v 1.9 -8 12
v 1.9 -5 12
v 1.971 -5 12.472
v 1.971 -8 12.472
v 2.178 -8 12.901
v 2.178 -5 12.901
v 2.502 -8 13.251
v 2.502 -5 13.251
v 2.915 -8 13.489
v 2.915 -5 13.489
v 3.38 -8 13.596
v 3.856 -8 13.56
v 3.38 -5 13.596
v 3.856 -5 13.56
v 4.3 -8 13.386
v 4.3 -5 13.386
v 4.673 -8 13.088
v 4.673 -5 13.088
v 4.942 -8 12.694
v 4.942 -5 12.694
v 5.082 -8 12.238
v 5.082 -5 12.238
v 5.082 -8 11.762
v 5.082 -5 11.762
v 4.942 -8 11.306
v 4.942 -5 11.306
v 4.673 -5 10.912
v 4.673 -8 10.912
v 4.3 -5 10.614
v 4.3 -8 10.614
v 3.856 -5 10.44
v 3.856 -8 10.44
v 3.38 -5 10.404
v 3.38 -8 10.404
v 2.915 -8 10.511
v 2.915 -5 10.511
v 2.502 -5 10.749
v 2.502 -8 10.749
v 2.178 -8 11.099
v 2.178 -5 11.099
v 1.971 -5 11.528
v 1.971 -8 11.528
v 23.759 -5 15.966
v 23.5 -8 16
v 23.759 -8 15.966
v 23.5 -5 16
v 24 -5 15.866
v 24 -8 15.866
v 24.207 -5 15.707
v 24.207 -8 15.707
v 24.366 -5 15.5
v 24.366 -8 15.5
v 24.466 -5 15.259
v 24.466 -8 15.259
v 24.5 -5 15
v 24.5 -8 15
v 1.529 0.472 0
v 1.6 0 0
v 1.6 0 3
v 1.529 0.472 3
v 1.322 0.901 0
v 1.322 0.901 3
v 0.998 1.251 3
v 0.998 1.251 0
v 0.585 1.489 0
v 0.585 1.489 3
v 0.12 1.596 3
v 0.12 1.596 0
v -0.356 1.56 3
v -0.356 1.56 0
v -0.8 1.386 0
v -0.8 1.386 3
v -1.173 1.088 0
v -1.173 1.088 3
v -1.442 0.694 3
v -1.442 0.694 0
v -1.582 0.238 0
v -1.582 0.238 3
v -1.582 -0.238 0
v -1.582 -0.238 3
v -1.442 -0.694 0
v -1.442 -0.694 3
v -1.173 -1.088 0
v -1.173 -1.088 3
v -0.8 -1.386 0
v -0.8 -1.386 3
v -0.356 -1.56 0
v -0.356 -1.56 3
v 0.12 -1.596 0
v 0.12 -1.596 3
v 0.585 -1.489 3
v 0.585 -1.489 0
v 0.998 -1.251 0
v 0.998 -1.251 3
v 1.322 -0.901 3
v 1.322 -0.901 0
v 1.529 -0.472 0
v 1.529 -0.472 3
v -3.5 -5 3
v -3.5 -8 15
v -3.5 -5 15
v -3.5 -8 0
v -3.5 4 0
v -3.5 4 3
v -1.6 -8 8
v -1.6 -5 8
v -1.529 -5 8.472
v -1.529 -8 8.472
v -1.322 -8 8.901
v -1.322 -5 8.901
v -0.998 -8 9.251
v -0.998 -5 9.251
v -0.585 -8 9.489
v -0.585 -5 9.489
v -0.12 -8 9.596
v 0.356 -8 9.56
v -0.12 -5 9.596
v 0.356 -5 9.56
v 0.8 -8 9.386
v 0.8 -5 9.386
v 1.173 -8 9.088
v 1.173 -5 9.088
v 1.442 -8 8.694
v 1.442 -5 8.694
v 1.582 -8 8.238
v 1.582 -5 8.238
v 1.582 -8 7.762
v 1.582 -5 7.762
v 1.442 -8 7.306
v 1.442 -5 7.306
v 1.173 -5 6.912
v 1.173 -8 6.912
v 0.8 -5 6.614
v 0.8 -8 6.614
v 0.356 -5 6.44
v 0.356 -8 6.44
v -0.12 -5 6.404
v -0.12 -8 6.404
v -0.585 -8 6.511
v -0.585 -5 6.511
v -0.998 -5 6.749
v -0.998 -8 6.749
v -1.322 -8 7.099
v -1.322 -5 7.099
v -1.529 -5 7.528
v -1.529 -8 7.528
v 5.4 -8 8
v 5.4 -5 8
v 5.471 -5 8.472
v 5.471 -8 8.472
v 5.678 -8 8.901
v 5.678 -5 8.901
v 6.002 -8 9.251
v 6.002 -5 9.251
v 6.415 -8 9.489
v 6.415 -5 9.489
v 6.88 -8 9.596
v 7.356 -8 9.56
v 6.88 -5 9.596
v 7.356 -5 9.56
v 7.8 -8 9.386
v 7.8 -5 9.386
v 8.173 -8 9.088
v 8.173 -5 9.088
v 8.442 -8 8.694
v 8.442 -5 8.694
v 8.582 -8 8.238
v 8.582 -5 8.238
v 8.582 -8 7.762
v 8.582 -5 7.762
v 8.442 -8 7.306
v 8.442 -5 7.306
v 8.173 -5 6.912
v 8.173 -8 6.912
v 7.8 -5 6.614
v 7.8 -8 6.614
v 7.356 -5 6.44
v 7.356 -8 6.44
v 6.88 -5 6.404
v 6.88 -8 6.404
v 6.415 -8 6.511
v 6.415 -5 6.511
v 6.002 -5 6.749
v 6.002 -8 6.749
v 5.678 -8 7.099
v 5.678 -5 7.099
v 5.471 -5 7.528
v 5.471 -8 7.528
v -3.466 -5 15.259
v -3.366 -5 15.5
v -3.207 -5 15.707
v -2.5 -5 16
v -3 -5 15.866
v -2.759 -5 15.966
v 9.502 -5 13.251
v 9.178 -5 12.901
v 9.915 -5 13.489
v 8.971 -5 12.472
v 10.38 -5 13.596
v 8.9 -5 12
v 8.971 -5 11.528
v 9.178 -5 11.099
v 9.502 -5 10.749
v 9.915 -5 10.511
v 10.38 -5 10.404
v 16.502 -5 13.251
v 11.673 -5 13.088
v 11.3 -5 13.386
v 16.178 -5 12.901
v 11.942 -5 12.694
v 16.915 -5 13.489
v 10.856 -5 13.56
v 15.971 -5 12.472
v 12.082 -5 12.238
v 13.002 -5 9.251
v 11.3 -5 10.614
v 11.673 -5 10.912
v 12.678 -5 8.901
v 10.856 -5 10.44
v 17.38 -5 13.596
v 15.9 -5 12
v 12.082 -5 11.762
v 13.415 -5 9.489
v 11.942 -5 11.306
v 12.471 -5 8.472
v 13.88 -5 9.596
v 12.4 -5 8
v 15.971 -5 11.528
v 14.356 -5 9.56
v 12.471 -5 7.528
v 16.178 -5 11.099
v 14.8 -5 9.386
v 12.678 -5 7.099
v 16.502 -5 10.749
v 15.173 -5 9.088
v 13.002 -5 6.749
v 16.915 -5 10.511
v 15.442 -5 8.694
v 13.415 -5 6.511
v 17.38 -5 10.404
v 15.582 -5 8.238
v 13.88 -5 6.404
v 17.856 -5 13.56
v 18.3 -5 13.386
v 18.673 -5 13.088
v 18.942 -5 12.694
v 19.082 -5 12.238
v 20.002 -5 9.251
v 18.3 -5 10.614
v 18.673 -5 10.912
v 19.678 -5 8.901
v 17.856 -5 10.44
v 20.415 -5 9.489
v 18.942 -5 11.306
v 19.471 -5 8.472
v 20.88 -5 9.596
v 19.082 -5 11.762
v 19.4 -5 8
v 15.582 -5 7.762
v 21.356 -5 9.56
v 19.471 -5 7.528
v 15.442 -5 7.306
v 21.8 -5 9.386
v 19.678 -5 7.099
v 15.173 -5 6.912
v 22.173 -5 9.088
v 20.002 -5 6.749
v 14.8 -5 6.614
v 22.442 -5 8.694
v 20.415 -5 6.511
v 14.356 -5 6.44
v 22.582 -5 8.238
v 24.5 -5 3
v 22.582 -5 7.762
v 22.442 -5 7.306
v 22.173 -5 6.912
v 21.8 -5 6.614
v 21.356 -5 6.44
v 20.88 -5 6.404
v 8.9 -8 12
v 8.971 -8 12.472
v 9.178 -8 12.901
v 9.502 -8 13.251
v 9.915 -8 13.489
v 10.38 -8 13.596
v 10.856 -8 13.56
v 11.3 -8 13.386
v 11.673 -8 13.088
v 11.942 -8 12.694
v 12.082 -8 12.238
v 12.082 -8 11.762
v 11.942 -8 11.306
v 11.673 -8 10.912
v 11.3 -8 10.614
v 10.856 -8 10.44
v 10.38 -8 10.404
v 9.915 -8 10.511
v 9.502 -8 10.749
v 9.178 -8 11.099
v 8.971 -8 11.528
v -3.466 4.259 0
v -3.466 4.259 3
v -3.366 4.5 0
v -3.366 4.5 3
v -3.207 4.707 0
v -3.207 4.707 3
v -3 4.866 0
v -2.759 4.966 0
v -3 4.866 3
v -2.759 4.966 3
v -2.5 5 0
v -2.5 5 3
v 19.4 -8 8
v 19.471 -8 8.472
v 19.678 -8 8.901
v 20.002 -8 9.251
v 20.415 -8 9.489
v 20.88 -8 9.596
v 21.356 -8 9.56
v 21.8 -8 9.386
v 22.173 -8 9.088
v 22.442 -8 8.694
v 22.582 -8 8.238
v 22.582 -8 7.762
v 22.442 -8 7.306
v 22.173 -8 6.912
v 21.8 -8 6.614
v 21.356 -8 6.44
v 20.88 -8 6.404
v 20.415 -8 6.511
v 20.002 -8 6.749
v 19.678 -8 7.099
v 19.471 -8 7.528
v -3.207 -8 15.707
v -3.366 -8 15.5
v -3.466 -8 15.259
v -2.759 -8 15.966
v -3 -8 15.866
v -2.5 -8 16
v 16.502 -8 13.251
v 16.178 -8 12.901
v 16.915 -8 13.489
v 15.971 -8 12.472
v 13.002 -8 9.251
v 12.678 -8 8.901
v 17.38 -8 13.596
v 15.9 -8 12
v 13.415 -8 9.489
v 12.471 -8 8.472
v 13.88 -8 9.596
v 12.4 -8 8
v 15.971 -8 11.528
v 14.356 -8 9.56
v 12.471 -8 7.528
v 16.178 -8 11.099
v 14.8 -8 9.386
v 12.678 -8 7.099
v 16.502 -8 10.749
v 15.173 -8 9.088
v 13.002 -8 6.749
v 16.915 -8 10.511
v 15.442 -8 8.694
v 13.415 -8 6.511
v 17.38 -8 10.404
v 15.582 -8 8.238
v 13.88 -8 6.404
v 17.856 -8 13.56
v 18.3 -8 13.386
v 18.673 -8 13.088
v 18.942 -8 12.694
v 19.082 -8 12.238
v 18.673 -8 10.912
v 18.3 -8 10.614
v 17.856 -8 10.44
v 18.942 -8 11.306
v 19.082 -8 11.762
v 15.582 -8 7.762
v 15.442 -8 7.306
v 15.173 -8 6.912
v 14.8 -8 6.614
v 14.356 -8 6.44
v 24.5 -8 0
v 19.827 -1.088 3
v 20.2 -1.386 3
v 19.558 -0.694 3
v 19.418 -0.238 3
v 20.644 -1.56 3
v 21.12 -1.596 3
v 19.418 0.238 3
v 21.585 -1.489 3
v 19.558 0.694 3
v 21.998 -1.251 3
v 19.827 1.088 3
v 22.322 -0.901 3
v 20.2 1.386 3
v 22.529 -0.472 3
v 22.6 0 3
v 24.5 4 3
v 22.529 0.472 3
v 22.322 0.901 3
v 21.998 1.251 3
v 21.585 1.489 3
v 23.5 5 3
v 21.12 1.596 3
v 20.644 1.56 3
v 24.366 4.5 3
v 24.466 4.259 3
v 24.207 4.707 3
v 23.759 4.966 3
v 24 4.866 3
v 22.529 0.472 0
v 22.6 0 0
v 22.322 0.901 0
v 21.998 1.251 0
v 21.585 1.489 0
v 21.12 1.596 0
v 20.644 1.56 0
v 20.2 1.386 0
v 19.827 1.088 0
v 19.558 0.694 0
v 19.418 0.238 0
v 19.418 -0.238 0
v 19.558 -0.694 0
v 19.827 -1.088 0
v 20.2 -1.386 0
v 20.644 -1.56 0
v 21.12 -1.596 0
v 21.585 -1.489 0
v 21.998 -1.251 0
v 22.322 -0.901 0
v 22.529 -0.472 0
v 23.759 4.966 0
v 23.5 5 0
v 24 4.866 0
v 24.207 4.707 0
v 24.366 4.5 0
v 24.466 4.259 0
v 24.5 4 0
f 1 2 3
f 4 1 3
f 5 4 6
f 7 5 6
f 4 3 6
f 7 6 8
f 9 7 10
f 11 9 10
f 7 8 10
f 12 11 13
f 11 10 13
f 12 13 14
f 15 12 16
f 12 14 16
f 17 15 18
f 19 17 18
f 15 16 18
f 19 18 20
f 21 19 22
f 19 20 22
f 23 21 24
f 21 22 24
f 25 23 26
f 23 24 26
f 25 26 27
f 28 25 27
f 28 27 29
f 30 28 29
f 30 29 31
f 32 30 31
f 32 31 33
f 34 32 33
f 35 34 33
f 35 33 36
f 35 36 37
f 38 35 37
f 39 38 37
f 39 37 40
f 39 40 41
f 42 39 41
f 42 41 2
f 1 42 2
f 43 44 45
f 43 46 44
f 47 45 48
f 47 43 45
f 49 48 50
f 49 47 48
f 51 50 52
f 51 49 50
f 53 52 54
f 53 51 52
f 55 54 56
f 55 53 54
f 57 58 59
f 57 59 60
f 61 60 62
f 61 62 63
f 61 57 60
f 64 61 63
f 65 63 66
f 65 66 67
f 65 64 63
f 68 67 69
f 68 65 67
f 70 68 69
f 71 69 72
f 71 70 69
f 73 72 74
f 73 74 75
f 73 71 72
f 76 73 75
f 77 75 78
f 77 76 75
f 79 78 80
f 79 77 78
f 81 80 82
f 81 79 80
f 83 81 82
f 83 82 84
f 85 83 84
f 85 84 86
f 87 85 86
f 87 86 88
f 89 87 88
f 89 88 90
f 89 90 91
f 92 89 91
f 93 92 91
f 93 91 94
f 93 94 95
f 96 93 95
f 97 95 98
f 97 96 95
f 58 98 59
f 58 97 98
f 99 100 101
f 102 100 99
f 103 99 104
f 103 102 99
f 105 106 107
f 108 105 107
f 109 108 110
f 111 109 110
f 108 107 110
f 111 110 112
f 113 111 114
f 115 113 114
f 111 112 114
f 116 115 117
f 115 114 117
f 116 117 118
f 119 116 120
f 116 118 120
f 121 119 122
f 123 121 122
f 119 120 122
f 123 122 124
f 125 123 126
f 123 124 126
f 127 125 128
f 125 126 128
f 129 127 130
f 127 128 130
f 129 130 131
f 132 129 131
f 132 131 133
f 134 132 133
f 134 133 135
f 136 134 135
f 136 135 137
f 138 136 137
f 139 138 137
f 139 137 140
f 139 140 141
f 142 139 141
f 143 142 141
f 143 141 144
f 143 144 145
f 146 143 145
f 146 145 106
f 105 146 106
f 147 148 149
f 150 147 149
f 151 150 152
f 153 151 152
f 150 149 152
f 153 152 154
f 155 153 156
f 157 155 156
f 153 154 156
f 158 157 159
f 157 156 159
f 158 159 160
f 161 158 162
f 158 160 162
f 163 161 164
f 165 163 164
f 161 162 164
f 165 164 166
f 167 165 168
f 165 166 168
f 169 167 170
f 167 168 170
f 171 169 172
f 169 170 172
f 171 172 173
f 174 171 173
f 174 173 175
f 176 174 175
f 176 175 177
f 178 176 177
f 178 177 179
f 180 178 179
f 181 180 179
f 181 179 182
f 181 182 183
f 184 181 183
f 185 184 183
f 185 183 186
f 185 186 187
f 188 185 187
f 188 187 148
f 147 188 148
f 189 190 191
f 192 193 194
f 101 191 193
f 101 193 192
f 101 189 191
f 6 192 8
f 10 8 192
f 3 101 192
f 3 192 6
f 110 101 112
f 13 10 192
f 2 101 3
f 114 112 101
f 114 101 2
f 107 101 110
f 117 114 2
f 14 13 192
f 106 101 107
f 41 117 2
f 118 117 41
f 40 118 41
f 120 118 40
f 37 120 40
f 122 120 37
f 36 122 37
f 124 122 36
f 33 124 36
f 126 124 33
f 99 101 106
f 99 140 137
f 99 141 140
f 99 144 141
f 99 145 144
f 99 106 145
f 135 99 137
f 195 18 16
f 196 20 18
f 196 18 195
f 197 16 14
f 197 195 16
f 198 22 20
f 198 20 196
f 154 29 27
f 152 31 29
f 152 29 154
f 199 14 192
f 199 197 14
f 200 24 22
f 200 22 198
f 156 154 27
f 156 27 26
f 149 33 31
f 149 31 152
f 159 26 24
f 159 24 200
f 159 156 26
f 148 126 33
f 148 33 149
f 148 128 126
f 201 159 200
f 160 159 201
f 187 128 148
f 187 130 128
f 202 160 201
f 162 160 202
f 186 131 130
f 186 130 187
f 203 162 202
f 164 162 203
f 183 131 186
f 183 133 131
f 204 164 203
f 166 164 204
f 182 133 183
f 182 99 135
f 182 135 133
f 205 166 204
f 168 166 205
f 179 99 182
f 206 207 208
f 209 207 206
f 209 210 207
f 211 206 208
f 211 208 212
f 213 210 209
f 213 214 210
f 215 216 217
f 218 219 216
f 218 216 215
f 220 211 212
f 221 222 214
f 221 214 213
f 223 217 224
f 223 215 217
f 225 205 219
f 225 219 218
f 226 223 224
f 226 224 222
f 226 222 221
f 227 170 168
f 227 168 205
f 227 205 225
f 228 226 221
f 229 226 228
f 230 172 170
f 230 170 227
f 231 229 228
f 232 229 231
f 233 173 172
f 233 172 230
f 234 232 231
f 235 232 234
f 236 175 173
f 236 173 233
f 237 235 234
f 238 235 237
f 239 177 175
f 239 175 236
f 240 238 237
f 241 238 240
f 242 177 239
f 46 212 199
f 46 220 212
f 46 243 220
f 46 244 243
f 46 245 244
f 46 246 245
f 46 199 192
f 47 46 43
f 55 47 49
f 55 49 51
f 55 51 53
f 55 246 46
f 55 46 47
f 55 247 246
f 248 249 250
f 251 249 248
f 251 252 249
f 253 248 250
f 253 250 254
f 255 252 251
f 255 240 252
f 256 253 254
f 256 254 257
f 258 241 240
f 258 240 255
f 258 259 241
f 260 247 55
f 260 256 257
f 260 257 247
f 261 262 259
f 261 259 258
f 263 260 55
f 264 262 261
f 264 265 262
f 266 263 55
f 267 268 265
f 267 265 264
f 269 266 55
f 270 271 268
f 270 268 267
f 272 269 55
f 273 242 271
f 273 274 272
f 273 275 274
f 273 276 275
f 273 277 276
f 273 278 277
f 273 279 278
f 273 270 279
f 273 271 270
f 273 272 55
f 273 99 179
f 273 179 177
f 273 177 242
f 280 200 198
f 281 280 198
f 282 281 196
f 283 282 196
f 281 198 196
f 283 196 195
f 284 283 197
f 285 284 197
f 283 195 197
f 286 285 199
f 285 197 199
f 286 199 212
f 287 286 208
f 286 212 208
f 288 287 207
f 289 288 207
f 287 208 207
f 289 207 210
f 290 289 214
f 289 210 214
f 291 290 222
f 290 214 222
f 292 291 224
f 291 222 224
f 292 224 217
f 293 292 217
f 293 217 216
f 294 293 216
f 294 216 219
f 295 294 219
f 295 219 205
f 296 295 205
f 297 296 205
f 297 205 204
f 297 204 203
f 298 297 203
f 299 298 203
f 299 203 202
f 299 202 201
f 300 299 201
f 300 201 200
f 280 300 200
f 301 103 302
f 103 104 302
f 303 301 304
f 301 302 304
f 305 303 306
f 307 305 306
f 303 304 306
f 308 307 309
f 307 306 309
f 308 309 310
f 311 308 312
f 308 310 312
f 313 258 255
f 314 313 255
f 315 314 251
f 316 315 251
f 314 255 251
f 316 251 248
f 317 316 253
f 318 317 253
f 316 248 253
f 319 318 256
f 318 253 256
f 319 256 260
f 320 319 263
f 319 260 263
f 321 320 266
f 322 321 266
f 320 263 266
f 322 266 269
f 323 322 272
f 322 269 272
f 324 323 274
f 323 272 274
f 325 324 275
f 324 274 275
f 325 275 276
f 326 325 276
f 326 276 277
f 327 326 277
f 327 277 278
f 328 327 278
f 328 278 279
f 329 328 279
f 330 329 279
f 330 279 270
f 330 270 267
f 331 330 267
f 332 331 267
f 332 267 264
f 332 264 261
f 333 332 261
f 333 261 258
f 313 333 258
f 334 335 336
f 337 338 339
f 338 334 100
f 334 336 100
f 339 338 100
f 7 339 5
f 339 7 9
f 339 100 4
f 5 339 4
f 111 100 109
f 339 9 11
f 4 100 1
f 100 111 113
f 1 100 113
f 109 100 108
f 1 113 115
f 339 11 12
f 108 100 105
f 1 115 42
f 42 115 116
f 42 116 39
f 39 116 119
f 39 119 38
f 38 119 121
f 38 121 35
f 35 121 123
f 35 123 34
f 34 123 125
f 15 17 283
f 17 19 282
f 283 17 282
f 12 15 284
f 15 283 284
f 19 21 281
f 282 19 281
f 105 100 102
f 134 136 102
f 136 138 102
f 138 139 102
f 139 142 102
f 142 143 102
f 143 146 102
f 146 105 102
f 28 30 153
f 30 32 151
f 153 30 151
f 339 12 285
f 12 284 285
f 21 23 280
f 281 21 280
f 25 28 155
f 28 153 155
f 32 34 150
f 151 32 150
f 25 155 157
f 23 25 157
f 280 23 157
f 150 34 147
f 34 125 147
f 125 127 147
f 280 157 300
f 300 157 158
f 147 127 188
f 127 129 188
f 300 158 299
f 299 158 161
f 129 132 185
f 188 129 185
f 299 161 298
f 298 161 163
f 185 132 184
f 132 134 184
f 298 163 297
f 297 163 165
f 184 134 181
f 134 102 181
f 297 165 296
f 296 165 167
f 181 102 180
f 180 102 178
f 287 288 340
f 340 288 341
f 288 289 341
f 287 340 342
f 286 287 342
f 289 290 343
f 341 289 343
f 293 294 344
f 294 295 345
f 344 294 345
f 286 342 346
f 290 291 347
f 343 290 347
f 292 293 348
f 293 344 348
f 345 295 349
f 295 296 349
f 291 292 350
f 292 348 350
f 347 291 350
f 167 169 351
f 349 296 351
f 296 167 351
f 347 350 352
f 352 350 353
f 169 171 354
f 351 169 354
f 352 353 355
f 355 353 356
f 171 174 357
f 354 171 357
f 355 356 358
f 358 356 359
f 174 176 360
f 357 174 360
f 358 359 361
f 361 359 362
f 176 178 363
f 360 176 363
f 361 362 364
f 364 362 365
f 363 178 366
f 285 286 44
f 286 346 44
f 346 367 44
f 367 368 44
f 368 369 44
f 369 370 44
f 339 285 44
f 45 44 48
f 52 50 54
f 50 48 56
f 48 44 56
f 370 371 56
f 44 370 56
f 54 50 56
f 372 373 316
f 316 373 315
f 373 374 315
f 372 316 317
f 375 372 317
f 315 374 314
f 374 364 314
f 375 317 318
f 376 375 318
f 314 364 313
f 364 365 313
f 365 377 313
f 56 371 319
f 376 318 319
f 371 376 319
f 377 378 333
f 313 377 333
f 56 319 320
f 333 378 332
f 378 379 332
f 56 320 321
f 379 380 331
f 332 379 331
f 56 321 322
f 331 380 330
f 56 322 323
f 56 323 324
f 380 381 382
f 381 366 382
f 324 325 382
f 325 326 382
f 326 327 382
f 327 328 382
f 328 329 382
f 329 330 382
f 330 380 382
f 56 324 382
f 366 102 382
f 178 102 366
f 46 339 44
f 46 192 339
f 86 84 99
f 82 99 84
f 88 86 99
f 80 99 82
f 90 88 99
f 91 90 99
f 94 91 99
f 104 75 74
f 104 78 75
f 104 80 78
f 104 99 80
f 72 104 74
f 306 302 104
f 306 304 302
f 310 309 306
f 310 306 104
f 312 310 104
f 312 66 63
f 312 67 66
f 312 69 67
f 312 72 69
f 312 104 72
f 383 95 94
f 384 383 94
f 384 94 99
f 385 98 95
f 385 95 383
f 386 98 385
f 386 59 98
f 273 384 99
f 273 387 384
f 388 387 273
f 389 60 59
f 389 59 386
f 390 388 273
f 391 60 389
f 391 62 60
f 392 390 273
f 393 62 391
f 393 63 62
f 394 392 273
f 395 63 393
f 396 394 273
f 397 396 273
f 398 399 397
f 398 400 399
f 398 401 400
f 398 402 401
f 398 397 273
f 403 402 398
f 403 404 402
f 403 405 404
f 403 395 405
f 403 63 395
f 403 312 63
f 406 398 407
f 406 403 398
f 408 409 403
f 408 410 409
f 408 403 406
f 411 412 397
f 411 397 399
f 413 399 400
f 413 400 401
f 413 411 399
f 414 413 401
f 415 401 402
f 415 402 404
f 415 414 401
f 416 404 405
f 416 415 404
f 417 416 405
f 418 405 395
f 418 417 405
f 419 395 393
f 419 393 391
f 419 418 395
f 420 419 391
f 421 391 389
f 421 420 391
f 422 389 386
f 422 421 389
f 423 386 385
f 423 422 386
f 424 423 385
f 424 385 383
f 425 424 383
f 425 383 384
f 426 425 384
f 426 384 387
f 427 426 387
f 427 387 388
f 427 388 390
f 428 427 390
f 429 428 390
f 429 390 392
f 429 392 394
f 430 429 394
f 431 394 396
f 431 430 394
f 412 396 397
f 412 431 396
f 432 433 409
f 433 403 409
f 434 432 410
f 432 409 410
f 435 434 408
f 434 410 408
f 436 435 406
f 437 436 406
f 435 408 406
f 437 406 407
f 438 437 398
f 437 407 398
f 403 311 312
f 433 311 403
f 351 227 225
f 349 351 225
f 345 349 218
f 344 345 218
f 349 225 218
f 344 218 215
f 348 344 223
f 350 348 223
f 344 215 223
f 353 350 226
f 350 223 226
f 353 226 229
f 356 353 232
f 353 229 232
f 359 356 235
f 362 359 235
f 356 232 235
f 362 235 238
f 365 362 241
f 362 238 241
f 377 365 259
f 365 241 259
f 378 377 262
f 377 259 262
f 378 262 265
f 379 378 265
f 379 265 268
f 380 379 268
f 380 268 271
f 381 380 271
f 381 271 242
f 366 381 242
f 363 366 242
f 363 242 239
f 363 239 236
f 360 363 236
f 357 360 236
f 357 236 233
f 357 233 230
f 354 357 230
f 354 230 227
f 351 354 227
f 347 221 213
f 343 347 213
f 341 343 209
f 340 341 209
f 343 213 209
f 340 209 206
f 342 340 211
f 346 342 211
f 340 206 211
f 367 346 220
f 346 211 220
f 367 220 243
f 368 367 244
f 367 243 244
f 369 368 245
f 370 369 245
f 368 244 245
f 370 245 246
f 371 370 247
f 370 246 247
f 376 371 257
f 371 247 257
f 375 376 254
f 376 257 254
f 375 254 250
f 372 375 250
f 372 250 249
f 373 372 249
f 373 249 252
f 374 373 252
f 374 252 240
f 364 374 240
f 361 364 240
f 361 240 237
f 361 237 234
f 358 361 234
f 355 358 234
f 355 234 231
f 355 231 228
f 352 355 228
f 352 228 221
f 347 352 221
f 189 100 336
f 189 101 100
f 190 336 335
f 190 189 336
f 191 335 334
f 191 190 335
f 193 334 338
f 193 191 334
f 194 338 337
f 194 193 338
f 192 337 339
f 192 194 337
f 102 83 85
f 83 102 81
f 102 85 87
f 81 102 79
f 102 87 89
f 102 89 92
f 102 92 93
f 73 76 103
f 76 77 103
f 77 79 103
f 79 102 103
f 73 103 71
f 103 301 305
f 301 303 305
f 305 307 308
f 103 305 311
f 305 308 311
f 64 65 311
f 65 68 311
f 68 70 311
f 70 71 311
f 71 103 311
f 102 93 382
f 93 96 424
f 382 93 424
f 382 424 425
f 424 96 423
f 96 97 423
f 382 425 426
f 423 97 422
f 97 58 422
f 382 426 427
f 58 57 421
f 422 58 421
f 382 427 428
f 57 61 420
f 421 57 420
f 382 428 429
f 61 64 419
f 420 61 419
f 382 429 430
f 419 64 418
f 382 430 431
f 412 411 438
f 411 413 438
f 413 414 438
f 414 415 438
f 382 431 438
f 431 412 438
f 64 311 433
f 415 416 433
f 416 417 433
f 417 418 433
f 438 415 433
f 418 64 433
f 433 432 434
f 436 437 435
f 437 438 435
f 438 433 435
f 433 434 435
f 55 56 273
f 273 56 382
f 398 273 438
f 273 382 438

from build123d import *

# Parameters (mm, degrees)
SKETCH_W     = 28
SKETCH_H     = 13
SKETCH_R     = 1.6
PAD_DEPTH    = 3
SKETCH001_W  = 28
SKETCH001_H  = 3
PAD001_DEPTH = 13
SKETCH002_R  = 1.6
POCKET_DEPTH = 3.001
FILLET_R     = 1


with BuildPart() as part:
    # Sketch → Pad (new body)
    with BuildSketch(Plane.XY):
        with Locations((10.5, -1.5)):
            Rectangle(SKETCH_W, SKETCH_H)
        Circle(SKETCH_R, mode=Mode.SUBTRACT)
        with Locations((21, 0)):
            Circle(SKETCH_R, mode=Mode.SUBTRACT)
    extrude(amount=PAD_DEPTH)

    # Sketch001 (on Face8 of Pad) → Pad001 (join)
    with BuildSketch(Plane.XY.offset(3)):
        with Locations((10.5, -6.5)):
            Rectangle(SKETCH001_W, SKETCH001_H)
    extrude(amount=PAD001_DEPTH)

    # Sketch002 (on Face11 of Pad001) → Pocket (cut, through all)
    with BuildSketch(Plane(origin=(0, -5, 0), x_dir=(-1, 0, 0), z_dir=(0, 1, 0))):
        with Locations((-21, 8)):
            Circle(SKETCH002_R)
        with Locations((-17.5, 12)):
            Circle(SKETCH002_R)
        with Locations((-14, 8)):
            Circle(SKETCH002_R)
        with Locations((-10.5, 12)):
            Circle(SKETCH002_R)
        with Locations((-7, 8)):
            Circle(SKETCH002_R)
        with Locations((-3.5, 12)):
            Circle(SKETCH002_R)
        with Locations((0, 8)):
            Circle(SKETCH002_R)
    extrude(amount=-POCKET_DEPTH, mode=Mode.SUBTRACT)

    # Fillet
    fillet_edges = [part.edges().sort_by_distance(p)[0] for p in [
        (24.5, -6.5, 16),
        (-3.5, -6.5, 16),
        (-3.5, 5, 1.5),
        (24.5, 5, 1.5),
    ]]
    fillet(fillet_edges, radius=FILLET_R)


solid = part.part
